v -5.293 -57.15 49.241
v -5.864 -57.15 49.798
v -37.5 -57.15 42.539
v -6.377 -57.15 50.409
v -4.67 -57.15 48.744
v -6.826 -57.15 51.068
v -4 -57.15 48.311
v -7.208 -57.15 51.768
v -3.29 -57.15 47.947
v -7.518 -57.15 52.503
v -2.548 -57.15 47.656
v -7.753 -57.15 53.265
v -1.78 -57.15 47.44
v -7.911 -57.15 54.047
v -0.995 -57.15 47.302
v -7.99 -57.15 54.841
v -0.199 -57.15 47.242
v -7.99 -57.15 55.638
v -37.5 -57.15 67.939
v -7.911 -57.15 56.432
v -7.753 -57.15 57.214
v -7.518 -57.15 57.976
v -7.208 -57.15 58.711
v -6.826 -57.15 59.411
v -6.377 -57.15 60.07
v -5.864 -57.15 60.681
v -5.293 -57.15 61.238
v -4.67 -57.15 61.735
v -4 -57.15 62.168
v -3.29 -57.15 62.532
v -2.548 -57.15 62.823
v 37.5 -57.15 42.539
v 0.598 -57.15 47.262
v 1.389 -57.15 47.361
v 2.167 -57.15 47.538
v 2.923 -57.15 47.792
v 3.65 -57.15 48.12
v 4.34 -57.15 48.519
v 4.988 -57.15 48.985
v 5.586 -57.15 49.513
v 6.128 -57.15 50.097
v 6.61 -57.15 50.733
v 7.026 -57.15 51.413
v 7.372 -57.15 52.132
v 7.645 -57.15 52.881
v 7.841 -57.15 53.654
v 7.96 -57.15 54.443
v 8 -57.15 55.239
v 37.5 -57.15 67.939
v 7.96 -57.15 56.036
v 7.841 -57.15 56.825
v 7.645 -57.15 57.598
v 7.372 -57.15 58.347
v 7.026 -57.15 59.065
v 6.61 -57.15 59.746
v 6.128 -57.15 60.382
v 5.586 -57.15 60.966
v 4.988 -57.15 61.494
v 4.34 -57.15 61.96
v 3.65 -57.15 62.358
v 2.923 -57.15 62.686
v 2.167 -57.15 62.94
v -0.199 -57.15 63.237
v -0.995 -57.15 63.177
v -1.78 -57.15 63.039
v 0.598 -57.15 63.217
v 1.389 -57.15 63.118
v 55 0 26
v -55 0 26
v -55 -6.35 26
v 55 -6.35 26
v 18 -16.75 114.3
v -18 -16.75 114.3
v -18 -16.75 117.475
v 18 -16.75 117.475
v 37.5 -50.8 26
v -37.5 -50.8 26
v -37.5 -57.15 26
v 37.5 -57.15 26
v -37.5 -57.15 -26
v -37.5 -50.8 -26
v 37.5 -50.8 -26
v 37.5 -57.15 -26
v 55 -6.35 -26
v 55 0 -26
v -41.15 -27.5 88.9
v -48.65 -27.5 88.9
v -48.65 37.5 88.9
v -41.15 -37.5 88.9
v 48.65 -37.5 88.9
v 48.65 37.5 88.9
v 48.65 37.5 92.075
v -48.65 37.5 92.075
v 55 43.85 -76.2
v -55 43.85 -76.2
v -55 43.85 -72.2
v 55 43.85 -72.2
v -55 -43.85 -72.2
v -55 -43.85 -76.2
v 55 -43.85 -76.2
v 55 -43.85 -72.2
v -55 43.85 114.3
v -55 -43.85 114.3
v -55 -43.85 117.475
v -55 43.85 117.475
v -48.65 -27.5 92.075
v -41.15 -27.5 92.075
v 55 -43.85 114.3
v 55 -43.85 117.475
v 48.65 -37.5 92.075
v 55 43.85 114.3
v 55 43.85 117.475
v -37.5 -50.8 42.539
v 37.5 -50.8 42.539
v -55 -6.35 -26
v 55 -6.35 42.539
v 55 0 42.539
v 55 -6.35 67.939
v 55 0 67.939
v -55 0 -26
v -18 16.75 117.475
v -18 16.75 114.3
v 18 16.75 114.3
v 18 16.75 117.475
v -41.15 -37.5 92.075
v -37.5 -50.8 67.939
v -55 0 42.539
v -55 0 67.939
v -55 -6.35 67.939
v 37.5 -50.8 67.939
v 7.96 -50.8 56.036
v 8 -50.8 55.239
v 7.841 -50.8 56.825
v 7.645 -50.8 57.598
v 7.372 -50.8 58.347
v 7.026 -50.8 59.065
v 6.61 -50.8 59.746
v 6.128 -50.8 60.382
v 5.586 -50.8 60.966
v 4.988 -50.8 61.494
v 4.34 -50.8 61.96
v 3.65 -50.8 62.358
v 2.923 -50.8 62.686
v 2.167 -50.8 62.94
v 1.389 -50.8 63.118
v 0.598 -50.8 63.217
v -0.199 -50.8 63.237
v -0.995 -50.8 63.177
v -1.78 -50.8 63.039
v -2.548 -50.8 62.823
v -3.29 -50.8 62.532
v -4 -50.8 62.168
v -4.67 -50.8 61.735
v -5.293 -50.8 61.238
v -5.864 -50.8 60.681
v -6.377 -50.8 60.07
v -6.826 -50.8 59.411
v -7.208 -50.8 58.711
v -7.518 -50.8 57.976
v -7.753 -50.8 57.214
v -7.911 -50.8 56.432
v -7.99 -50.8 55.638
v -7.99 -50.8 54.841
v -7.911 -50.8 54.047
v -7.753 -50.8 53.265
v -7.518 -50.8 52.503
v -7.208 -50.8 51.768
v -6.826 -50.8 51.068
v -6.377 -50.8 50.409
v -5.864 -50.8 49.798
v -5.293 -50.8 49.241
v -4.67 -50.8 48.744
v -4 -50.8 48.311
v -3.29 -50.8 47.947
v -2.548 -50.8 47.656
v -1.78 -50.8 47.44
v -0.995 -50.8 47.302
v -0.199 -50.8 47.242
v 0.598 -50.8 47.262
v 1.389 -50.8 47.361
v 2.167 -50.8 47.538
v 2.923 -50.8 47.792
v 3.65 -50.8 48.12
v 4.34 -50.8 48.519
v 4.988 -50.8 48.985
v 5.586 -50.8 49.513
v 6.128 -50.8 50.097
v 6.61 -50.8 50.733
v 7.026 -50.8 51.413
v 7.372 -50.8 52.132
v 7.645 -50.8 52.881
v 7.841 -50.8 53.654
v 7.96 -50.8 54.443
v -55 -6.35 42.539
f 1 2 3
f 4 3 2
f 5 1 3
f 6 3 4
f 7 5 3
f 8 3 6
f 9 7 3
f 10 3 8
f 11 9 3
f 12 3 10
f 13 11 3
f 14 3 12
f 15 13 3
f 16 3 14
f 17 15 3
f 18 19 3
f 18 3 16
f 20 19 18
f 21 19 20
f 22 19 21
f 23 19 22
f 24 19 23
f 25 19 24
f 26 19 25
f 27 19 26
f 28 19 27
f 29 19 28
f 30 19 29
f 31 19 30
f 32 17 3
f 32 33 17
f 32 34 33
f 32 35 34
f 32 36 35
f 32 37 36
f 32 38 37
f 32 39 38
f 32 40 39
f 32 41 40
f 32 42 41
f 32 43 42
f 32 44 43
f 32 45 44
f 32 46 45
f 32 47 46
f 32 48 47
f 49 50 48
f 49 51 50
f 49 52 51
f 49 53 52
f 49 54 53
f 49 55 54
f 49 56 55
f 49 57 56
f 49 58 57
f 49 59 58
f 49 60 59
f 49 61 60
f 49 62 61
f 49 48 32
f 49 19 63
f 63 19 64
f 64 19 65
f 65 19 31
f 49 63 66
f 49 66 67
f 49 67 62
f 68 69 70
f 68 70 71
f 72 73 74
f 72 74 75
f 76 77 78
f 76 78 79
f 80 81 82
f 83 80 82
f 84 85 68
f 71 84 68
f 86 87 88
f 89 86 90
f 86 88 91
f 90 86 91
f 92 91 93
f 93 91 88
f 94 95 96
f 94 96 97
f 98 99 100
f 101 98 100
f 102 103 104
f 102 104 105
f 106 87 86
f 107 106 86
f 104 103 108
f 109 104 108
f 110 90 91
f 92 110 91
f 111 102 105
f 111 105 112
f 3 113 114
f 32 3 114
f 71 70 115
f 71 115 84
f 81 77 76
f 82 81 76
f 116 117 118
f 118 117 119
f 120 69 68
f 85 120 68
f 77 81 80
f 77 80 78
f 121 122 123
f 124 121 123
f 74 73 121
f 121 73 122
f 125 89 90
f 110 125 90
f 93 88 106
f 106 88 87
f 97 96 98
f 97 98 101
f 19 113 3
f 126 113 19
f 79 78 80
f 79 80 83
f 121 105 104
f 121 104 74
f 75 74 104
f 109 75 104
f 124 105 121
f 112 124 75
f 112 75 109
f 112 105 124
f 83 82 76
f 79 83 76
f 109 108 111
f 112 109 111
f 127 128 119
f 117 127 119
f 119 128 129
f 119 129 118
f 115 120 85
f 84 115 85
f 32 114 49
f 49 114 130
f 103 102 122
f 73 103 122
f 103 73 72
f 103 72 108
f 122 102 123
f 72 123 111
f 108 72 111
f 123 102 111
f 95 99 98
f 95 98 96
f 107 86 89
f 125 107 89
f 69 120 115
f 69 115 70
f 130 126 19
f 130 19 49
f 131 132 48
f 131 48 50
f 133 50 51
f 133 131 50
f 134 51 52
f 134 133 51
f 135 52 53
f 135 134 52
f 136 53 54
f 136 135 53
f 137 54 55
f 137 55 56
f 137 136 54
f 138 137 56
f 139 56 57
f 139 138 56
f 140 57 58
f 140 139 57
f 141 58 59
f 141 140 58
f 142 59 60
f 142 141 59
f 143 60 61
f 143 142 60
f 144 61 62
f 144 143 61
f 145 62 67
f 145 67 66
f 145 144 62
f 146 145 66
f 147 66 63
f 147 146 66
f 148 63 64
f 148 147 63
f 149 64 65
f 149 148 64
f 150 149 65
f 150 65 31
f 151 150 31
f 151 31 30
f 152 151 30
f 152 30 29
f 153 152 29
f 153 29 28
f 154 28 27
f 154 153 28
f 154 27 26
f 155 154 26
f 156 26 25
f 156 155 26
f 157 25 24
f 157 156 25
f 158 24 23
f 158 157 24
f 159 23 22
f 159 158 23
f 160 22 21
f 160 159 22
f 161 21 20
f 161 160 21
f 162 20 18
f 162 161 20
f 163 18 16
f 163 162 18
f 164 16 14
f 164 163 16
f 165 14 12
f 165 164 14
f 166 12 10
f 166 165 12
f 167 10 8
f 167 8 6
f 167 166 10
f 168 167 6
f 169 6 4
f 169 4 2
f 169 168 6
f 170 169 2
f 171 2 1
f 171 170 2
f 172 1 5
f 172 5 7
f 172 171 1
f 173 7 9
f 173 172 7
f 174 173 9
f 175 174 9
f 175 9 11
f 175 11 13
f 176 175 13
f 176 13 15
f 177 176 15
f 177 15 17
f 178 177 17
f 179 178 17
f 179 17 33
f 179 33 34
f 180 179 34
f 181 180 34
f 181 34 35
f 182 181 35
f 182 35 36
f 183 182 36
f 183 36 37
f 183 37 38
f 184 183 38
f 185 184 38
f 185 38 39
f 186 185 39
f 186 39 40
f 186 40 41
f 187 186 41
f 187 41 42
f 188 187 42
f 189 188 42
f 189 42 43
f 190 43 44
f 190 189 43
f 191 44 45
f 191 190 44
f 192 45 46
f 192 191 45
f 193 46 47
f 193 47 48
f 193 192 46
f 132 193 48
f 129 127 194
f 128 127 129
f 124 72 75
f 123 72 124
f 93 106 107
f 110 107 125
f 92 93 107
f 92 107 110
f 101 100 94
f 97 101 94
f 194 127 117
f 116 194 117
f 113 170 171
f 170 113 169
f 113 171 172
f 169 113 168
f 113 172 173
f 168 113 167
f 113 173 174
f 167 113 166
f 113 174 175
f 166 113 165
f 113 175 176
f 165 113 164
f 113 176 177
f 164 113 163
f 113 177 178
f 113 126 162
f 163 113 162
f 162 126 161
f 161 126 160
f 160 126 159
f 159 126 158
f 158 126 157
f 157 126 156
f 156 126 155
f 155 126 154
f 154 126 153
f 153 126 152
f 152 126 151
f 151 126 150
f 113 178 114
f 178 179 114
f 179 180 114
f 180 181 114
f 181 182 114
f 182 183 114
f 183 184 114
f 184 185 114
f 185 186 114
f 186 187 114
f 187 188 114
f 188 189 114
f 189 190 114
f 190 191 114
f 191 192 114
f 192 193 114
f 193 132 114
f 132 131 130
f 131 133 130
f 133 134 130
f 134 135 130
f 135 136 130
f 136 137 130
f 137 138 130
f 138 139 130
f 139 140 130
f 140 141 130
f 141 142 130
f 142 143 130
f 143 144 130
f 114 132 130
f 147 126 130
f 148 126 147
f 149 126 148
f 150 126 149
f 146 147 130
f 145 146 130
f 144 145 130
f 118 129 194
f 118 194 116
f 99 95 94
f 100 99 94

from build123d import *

# Parameters (mm, degrees)
F0_W      = 110
F0_H      = 52
F1_DEPTH  = 6.35
F3_W      = 75
F3_H      = 52
F4_DEPTH  = 6.35
F6_W      = 110
F6_H      = 87.7
F7_DEPTH  = 4
F8_W      = 110
F8_H      = 25.4
F9_DEPTH  = 6.35
F10_W     = 75
F10_H     = 25.4
F10_R     = 8
F11_DEPTH = 6.35
F14_DEPTH = 3.175
F16_W     = 110
F16_H     = 87.7
F16_W_2   = 36
F16_H_2   = 33.5
F17_DEPTH = 3.175


with BuildPart() as f1:
    # F0 (on Front) → F1 (new body)
    with BuildSketch(Plane.XZ):
        Rectangle(F0_W, F0_H)
    extrude(amount=F1_DEPTH)


with BuildPart() as f4:
    # F3 (on offset) → F4 (new body)
    with BuildSketch(Plane.XZ.offset(50.8)):
        Rectangle(F3_W, F3_H)
    extrude(amount=F4_DEPTH)


with BuildPart() as f7:
    # F6 (on offset) → F7 (new body)
    with BuildSketch(Plane.XY.offset(-76.2)):
        Rectangle(F6_W, F6_H)
    extrude(amount=F7_DEPTH)


with BuildPart() as f9:
    # F8 (on Front) → F9 (new body)
    with BuildSketch(Plane.XZ):
        with Locations((0, 55.239461)):
            Rectangle(F8_W, F8_H)
    extrude(amount=F9_DEPTH)


with BuildPart() as f11:
    # F10 (on offset) → F11 (new body)
    with BuildSketch(Plane.XZ.offset(50.8)):
        with Locations((0, 55.239461)):
            Rectangle(F10_W, F10_H)
        with Locations((0, 55.239461)):
            Circle(F10_R, mode=Mode.SUBTRACT)
    extrude(amount=F11_DEPTH)


with BuildPart() as f14:
    # F13 (on offset) → F14 (new body)
    with BuildSketch(Plane.XY.offset(88.9)):
        Polygon((48.650001, -37.500001), (48.650001, 37.500001), (-48.650001, 37.500001), (-48.650001, -27.500001), (-41.150001, -27.500001), (-41.150001, -37.500001), align=None)
    extrude(amount=F14_DEPTH)


with BuildPart() as f17:
    # F16 (on offset) → F17 (new body)
    with BuildSketch(Plane.XY.offset(114.3)):
        Rectangle(F16_W, F16_H)
        Rectangle(F16_W_2, F16_H_2, mode=Mode.SUBTRACT)
    extrude(amount=F17_DEPTH)


solid = Compound([f1.part, f4.part, f7.part, f9.part, f11.part, f14.part, f17.part])
